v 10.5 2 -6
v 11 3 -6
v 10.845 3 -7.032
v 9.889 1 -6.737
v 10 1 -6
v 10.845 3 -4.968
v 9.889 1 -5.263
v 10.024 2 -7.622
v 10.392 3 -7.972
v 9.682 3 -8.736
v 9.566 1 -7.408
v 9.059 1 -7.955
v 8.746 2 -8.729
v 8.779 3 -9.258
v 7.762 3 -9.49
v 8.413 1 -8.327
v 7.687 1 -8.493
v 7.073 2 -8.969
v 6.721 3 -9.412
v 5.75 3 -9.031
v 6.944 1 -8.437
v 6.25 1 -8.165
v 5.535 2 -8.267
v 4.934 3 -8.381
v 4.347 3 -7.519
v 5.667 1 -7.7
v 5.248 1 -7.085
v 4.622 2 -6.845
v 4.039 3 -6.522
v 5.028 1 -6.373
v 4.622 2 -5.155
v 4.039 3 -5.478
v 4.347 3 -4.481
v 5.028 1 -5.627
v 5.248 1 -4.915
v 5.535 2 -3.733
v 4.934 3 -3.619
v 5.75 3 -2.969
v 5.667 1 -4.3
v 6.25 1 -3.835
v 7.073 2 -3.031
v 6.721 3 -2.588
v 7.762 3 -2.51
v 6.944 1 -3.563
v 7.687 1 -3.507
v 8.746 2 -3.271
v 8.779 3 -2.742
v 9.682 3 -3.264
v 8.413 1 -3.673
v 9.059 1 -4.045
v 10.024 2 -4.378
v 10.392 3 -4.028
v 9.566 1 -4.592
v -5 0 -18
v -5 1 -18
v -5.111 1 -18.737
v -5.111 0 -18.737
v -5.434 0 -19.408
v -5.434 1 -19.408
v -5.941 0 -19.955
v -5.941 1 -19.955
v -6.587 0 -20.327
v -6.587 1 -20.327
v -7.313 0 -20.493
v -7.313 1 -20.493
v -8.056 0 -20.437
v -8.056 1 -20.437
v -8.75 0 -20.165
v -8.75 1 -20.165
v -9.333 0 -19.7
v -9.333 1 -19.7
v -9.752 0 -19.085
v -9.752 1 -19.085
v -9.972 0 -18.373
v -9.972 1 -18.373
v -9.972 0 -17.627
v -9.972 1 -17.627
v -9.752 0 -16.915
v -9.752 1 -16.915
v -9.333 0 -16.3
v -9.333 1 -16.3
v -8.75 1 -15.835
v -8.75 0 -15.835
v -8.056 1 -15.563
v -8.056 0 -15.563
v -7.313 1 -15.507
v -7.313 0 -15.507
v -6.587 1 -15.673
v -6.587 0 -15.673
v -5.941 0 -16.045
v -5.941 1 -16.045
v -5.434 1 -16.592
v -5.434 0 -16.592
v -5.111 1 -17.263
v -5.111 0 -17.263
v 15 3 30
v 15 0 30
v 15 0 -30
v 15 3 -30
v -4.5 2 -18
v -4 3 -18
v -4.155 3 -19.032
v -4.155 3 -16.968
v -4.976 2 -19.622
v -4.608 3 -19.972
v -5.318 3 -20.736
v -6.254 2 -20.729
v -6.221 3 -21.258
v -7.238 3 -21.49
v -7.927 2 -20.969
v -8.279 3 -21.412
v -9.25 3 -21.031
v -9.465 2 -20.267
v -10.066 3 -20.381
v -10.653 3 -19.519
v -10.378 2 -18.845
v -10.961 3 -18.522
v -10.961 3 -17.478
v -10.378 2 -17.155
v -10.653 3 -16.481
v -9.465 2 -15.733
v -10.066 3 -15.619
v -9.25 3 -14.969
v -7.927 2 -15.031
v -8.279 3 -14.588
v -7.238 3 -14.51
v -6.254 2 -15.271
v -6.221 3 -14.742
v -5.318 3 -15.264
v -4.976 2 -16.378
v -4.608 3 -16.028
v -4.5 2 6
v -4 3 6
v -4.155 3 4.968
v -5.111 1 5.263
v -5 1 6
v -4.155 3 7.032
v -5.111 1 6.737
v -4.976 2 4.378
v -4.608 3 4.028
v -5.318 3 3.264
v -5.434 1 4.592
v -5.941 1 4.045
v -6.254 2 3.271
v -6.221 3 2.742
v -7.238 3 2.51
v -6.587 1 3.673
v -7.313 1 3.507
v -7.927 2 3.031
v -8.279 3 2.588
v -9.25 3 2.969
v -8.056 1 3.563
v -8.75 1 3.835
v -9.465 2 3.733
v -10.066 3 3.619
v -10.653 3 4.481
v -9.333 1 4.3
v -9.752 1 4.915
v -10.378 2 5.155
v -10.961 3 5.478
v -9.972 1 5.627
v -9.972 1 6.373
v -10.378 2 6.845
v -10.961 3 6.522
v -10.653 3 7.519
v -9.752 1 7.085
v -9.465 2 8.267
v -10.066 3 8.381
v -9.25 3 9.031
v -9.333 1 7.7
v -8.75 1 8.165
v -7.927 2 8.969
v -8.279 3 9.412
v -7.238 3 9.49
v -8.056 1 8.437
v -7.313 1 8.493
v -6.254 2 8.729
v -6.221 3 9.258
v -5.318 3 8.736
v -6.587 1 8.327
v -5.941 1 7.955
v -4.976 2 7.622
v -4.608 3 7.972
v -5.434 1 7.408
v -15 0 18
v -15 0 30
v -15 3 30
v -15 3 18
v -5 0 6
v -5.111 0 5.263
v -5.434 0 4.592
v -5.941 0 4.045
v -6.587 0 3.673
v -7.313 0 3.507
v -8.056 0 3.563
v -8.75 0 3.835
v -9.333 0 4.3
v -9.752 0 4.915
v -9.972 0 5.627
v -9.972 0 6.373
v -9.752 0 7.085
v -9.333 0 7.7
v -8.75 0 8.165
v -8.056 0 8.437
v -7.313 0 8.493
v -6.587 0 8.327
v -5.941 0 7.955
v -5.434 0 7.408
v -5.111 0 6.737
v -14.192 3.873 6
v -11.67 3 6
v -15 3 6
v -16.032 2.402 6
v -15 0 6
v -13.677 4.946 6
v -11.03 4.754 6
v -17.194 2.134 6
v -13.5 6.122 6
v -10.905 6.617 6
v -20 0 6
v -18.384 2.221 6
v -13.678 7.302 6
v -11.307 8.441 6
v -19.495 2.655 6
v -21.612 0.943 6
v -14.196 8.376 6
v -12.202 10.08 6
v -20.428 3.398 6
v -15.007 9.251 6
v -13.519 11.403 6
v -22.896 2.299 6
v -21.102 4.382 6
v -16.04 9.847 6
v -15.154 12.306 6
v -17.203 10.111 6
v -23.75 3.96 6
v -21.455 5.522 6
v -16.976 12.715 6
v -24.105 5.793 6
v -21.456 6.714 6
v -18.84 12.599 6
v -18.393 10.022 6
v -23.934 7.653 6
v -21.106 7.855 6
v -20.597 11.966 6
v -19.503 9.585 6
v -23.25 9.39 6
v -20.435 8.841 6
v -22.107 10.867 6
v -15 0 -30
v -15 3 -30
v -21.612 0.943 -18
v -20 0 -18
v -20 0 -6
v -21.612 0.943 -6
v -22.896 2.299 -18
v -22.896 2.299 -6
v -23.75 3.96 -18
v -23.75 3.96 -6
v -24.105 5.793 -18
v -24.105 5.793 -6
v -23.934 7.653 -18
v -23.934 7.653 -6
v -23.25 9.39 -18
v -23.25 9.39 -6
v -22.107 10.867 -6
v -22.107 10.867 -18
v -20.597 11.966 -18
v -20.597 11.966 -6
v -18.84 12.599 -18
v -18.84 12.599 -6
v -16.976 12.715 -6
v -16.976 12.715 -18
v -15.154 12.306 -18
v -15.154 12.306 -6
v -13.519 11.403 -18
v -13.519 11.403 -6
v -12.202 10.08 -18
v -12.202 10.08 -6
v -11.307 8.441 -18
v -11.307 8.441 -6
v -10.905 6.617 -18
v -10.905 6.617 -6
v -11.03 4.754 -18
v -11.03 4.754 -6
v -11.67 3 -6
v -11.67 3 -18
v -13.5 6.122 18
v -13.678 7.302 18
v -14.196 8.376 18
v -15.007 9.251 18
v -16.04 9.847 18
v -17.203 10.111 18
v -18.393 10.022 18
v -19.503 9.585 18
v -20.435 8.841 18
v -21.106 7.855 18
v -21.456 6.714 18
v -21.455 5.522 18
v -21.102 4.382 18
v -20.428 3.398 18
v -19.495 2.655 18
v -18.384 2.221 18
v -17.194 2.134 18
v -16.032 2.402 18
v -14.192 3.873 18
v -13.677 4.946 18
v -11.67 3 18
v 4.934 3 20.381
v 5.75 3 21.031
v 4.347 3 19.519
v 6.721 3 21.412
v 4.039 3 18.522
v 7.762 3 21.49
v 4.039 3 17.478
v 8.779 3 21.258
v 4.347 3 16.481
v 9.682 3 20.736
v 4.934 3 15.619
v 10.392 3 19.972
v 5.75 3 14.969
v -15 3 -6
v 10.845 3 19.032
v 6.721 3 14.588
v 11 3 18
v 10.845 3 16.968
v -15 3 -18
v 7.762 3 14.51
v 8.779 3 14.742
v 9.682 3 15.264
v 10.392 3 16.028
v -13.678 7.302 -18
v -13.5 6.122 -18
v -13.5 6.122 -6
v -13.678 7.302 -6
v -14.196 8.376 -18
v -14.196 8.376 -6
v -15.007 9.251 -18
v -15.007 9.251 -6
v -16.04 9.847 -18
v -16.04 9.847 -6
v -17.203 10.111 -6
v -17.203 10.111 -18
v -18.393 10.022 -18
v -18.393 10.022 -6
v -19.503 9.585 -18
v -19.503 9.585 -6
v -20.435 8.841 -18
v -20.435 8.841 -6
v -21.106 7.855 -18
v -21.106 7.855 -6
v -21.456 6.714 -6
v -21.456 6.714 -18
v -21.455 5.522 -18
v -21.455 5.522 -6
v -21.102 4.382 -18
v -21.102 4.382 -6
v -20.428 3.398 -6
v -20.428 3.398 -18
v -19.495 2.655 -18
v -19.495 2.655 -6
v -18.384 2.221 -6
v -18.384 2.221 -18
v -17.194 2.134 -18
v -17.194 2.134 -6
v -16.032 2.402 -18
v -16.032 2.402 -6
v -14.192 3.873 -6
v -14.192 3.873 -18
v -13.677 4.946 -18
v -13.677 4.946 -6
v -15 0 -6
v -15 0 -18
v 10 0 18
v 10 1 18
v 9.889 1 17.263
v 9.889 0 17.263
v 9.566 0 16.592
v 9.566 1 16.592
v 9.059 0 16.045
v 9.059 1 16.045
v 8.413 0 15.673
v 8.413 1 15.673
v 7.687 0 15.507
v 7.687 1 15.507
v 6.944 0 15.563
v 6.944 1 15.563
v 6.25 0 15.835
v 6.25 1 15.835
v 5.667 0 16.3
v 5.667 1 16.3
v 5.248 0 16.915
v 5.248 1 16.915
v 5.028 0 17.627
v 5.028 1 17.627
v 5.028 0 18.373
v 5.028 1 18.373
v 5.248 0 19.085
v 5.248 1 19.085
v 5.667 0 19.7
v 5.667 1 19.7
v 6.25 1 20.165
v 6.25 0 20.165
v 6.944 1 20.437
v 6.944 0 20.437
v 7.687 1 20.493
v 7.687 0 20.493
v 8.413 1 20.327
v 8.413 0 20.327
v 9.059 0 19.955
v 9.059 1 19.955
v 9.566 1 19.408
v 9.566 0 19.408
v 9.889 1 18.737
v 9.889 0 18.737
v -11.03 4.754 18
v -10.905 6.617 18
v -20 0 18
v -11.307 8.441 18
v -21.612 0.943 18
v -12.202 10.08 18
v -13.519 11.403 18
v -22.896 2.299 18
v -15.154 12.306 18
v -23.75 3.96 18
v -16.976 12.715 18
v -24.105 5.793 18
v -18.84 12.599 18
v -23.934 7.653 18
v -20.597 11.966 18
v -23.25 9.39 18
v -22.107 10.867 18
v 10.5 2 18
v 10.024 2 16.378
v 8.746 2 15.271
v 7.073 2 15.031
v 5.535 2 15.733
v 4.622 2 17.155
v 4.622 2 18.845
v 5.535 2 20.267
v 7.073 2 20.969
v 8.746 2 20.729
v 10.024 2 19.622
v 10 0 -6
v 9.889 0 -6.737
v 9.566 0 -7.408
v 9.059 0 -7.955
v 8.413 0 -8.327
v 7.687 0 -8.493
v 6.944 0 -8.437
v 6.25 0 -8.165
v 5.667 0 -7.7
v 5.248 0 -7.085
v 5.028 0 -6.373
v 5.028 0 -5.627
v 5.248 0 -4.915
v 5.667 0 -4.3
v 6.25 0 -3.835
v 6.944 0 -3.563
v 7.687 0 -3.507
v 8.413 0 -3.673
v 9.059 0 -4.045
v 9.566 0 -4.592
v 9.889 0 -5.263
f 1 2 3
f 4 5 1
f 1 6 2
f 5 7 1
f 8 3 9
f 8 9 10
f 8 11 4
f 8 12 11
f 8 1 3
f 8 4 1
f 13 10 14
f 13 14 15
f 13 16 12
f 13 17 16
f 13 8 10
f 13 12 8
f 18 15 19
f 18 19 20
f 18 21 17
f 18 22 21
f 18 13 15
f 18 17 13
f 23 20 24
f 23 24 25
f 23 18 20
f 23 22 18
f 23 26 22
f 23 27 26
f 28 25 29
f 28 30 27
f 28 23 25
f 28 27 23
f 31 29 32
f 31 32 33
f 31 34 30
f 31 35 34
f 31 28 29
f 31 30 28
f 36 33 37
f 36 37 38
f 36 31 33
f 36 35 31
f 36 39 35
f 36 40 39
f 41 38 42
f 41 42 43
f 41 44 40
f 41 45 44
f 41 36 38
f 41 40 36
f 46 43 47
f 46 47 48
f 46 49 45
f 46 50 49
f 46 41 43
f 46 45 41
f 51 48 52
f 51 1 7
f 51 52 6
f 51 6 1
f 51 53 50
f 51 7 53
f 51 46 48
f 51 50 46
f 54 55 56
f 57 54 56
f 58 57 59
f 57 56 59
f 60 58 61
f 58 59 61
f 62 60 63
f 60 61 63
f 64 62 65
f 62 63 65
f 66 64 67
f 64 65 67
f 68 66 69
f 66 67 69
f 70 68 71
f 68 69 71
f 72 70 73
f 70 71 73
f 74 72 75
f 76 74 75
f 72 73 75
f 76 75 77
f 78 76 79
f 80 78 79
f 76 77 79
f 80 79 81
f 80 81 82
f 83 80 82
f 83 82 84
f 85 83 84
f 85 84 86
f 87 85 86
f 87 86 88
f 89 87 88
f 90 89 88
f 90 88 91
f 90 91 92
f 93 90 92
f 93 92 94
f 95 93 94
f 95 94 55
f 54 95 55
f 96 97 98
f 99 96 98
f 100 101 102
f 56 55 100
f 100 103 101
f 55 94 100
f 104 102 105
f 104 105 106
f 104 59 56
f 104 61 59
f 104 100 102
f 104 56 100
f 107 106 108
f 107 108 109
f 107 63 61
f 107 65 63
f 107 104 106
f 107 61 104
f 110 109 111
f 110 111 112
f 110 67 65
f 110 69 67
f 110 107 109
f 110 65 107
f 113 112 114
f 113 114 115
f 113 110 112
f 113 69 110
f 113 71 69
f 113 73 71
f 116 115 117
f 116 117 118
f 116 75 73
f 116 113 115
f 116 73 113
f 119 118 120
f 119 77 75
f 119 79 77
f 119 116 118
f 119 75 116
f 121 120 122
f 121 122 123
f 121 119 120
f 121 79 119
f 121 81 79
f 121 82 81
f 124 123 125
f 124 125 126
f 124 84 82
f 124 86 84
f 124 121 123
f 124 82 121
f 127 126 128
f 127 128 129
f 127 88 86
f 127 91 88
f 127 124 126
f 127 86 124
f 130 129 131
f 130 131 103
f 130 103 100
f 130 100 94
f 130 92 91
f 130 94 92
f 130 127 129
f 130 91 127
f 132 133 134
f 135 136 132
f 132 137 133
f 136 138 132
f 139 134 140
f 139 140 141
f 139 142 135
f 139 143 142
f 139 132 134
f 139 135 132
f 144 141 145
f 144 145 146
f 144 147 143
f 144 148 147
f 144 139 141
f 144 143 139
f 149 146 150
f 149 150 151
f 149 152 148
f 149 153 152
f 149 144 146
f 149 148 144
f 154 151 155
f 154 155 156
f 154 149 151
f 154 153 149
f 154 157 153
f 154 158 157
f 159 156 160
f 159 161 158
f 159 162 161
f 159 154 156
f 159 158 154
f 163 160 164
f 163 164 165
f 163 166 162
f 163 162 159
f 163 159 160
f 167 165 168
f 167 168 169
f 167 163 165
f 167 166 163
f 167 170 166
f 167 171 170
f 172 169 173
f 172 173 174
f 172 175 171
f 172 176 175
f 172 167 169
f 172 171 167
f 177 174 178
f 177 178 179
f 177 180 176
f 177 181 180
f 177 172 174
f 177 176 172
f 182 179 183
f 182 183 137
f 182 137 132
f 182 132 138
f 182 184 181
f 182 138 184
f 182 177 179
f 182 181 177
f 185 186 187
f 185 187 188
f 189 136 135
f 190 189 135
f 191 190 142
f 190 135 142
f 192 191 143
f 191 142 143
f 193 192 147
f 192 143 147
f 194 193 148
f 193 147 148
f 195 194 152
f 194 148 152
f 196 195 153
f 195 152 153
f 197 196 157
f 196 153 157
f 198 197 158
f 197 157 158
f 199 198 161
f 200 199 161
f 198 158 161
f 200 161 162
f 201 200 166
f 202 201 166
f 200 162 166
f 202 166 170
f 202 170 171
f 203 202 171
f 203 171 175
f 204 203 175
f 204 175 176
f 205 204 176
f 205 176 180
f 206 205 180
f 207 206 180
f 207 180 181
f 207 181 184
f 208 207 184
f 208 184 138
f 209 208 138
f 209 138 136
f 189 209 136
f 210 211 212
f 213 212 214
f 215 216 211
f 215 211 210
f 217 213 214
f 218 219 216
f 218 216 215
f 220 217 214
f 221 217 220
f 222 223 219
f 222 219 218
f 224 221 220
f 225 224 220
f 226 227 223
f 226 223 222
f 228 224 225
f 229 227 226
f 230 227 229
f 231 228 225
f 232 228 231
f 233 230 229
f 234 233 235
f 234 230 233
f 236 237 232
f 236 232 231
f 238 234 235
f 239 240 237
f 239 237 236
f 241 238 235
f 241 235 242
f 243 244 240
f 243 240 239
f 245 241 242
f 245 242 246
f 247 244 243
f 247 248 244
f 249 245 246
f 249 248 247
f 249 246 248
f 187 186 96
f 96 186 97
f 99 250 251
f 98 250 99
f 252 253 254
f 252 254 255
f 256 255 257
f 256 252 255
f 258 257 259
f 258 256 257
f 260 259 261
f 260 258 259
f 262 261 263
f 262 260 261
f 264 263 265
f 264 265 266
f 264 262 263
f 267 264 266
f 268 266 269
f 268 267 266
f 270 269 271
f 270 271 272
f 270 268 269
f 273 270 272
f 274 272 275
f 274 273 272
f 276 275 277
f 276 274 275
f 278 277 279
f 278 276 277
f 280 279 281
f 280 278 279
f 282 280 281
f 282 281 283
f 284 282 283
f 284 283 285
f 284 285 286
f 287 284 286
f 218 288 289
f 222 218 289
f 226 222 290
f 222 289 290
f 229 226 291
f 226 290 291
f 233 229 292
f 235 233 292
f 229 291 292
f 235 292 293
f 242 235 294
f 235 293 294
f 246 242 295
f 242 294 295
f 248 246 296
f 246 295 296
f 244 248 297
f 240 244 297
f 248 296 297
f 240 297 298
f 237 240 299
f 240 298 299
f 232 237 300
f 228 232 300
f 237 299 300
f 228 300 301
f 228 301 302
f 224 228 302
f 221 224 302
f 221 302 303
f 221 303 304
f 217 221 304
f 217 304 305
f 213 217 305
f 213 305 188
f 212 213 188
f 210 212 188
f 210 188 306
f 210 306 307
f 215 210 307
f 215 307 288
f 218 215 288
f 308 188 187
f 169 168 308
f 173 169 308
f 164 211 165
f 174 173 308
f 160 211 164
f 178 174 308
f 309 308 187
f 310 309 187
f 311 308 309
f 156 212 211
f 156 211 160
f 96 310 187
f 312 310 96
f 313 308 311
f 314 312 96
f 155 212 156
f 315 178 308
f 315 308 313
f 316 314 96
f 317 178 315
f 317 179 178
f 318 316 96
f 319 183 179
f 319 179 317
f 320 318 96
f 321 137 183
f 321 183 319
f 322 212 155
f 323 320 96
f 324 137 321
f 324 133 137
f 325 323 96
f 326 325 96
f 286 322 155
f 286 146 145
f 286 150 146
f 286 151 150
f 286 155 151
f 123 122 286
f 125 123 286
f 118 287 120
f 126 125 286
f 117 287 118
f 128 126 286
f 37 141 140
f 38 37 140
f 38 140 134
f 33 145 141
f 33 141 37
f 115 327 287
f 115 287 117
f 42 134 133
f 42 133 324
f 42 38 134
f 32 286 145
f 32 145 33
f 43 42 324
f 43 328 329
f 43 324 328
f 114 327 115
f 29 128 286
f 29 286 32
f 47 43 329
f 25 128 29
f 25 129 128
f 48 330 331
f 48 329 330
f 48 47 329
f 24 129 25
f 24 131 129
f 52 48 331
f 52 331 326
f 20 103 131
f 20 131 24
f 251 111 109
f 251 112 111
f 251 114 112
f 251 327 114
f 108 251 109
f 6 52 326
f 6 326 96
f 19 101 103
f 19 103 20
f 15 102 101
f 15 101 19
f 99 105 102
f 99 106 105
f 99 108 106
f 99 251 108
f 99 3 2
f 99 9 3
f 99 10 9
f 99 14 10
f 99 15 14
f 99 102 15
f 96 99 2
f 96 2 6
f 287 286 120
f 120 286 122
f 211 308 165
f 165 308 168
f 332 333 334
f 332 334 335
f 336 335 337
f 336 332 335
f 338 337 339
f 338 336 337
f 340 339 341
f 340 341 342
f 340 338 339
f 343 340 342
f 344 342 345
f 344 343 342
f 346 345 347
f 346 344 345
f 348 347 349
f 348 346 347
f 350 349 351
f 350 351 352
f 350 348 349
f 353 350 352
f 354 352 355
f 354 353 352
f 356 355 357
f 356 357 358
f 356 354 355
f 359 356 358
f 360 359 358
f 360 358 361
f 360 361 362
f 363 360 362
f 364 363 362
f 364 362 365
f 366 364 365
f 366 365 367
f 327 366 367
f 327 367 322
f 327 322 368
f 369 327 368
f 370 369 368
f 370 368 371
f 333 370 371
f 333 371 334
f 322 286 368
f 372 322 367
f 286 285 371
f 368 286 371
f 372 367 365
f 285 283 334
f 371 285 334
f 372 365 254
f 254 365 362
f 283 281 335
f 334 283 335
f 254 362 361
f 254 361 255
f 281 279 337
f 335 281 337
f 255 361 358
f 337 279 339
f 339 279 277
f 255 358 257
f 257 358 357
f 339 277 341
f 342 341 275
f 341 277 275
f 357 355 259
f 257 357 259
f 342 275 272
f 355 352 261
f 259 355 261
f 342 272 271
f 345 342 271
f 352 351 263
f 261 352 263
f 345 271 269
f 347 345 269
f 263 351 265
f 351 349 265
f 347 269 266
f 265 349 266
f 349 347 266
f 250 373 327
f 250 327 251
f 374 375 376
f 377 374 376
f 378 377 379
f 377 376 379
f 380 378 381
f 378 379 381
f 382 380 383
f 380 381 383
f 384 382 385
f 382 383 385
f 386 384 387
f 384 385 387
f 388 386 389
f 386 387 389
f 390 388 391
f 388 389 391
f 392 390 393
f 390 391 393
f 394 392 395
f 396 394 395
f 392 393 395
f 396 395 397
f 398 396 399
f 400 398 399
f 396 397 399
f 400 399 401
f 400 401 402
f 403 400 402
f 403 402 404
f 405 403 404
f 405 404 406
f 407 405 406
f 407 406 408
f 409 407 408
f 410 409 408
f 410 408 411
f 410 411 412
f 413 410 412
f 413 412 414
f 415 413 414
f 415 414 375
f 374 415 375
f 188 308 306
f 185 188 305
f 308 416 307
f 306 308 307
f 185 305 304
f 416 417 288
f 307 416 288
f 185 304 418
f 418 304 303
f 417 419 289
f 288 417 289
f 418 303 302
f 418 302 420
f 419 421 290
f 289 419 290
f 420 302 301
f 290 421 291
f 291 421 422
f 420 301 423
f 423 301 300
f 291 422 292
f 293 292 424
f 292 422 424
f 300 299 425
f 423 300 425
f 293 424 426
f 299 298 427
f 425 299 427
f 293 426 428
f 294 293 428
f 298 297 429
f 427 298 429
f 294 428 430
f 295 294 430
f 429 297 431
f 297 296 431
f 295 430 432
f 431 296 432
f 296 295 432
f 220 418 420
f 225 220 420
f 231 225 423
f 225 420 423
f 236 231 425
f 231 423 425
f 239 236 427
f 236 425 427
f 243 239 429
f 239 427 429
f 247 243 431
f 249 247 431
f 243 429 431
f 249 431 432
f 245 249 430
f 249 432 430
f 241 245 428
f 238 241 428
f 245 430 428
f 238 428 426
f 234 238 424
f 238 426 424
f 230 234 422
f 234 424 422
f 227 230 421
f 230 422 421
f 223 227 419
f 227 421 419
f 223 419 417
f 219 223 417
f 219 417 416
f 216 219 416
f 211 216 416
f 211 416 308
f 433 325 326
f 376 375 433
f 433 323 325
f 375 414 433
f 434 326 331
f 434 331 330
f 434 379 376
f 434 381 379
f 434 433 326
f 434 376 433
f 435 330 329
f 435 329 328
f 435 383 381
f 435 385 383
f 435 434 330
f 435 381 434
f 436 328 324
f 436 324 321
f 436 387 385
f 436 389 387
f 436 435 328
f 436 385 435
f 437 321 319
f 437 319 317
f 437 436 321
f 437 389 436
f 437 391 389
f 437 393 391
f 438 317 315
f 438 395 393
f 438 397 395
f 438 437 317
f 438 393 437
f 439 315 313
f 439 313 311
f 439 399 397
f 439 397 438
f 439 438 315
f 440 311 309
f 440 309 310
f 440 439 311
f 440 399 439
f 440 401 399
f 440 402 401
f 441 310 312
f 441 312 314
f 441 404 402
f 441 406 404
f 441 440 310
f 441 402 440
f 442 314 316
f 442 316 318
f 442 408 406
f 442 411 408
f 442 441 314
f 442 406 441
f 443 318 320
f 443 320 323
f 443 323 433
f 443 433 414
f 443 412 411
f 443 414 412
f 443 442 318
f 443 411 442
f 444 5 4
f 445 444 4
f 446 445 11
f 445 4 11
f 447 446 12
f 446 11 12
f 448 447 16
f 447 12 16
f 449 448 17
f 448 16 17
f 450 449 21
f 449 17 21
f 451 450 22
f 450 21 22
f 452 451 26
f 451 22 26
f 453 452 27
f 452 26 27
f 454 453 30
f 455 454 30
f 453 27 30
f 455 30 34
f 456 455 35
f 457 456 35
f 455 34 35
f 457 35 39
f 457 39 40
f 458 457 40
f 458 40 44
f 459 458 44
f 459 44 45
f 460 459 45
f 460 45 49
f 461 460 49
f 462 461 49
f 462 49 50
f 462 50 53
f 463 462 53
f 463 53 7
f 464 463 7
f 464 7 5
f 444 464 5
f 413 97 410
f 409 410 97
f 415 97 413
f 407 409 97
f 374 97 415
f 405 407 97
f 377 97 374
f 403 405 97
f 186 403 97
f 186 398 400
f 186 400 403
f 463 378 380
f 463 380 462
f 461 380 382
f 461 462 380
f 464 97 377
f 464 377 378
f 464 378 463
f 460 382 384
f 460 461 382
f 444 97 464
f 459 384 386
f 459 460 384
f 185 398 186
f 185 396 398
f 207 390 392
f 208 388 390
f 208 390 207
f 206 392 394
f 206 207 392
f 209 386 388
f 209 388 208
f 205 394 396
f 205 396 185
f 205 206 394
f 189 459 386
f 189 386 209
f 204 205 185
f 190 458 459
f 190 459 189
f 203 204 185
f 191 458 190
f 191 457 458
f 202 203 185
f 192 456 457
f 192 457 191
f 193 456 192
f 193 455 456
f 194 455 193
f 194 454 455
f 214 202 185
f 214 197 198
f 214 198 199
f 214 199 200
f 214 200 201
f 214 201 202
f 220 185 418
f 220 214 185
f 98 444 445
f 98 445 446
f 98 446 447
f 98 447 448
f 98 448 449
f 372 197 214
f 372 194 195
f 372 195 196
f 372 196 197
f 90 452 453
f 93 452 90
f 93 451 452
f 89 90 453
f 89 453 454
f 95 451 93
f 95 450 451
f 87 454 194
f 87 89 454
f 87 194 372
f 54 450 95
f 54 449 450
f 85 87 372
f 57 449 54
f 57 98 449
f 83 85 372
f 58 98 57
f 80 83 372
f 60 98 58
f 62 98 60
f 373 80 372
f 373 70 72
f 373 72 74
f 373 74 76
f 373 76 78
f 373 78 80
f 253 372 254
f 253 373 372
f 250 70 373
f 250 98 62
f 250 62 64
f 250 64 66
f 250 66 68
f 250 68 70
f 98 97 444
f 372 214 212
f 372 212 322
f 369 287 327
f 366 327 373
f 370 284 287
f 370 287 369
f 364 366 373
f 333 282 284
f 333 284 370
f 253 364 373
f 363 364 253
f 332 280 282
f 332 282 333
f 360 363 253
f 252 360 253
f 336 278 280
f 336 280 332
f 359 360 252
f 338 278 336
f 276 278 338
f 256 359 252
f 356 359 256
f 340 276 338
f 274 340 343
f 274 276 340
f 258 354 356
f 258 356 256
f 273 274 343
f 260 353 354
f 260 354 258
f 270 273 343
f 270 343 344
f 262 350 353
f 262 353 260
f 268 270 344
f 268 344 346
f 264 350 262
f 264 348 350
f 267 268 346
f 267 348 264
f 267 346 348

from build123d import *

# Parameters (mm, degrees)
SKETCH1_W           = 30
SKETCH1_H           = 60
BOSS_EXTRUDE1_DEPTH = 3
BOSS_EXTRUDE2_START = -12
SKETCH2_R           = 4
BOSS_EXTRUDE2_DEPTH = 12
SKETCH8_R           = 2.5
CUT_EXTRUDE1_DEPTH  = 4
CHAMFER1_SIZE       = 1
CHAMFER1_SIZE2      = 2


with BuildPart() as part:
    # Sketch1 → Boss-Extrude1 (new body)
    with BuildSketch(Plane(origin=(0, 0, 0), x_dir=(1, 0, 0), z_dir=(0, 1, 0))):
        Rectangle(SKETCH1_W, SKETCH1_H)
    extrude(amount=BOSS_EXTRUDE1_DEPTH)

    # Sketch2 → Boss-Extrude2 (add)
    with BuildSketch(Plane.XY.offset(30).offset(BOSS_EXTRUDE2_START)):
        with BuildLine():
            Line((-15, 0), (-20, 0))
            ThreePointArc((-20, 0), (-17.5, 12.735742832), (-15, 0))
        make_face()
        with Locations((-17.5, 6.122498999)):
            Circle(SKETCH2_R, mode=Mode.SUBTRACT)
    boss_extrude2 = extrude(amount=-BOSS_EXTRUDE2_DEPTH)

    # Mirror1: Boss-Extrude2 across plane
    add(boss_extrude2.mirror(Plane.XY))

    # Sketch8 → Cut-Extrude1 (cut, through all)
    with BuildSketch(Plane(origin=(0, 3, 0), x_dir=(1, 0, 0), z_dir=(0, 1, 0))):
        with Locations((7.5, -18)):
            Circle(SKETCH8_R)
        with Locations((-7.5, -6)):
            Circle(SKETCH8_R)
        with Locations((7.5, 6)):
            Circle(SKETCH8_R)
        with Locations((-7.5, 18)):
            Circle(SKETCH8_R)
    extrude(amount=-CUT_EXTRUDE1_DEPTH, mode=Mode.SUBTRACT)

    # Chamfer1
    chamfer1_edges = [part.edges().sort_by_distance(p)[0] for p in [
        (-10, 3, -18),
        (-10, 3, 6),
        (5, 3, 18),
        (5, 3, -6),
    ]]
    chamfer1_side = [part.faces().sort_by_distance(p)[0] for p in [
        (0.649167265, 3, 0),
    ]]
    chamfer(chamfer1_edges, length=CHAMFER1_SIZE, length2=CHAMFER1_SIZE2, reference=chamfer1_side[0])


solid = part.part
